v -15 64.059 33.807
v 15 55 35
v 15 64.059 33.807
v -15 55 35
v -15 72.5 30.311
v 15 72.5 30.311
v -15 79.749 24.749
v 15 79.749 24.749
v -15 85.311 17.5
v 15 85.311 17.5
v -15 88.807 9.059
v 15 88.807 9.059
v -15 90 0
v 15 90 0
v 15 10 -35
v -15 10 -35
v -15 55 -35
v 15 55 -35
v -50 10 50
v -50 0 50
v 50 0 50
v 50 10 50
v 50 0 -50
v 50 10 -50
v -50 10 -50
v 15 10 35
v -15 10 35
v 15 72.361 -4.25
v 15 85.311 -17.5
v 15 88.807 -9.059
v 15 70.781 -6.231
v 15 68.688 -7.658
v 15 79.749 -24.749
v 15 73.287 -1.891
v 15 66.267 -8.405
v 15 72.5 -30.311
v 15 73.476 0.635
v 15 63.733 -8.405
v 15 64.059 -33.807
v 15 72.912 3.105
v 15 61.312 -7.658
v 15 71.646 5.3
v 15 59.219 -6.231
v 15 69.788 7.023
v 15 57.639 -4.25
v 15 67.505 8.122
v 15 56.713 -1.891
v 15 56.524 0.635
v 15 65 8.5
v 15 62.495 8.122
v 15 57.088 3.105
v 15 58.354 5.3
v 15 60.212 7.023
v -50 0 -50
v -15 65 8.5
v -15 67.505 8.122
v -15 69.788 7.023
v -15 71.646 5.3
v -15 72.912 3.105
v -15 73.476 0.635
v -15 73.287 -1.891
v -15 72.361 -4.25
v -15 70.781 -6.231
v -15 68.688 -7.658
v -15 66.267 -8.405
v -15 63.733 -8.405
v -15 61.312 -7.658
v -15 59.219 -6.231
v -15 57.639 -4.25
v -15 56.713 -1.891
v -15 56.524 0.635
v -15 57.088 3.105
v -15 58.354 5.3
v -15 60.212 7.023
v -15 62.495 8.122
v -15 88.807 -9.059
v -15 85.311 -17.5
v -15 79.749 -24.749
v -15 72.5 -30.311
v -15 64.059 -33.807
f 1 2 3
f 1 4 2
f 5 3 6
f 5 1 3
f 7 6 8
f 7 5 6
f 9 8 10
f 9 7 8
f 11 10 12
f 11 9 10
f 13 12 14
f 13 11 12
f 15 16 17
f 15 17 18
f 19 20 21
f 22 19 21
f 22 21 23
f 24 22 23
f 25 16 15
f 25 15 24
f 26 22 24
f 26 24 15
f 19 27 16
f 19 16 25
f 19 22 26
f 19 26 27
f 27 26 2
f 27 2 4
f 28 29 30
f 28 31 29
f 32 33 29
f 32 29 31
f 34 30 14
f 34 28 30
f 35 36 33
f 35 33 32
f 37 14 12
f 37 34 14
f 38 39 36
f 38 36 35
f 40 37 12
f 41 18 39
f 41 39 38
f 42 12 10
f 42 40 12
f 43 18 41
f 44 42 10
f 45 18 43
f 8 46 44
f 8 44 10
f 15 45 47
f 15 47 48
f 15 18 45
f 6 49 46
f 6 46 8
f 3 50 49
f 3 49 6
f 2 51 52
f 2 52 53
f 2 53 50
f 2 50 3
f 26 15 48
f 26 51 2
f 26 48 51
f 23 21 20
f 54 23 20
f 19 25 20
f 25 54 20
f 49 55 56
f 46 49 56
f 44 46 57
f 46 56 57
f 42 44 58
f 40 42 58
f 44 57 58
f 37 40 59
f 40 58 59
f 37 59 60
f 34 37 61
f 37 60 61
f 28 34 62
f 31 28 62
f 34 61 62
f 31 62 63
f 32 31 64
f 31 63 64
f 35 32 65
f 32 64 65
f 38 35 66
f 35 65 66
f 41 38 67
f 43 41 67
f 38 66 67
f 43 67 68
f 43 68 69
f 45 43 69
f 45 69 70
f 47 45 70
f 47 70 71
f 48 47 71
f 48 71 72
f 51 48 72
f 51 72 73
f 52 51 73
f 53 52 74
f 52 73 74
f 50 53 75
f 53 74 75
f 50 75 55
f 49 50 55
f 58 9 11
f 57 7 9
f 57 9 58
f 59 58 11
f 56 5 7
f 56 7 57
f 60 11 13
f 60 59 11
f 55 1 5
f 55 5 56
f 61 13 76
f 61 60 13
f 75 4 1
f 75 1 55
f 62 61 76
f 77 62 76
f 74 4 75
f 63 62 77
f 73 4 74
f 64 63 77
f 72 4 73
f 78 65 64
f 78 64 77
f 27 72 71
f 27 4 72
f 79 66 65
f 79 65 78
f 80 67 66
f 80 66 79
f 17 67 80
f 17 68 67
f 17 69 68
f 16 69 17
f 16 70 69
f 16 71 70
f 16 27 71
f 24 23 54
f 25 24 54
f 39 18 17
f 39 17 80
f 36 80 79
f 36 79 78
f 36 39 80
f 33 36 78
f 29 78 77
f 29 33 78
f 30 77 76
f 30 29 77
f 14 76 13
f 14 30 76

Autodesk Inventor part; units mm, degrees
ref_plane "YZ Plane" through (0, 0, 0) normal (1, 0, 0) x (0, 1, 0)
ref_plane "XZ Plane" through (0, 0, 0) normal (0, 1, 0) x (-1, 0, 0)
ref_plane "XY Plane" through (0, 0, 0) normal (0, 0, 1) x (1, 0, 0)
sketch "Boceto1" plane through (0, 0, 0) normal (0, 1, 0) x (-1, 0, 0)
  line L0 (50, 50) -> (-50, 50)
  line L1 (-50, 50) -> (-50, -50)
  line L2 (-50, -50) -> (50, -50)
  line L3 (50, -50) -> (50, 50)
  line L4 (50, 50) -> (-50, -50) construction
  line L5 (-50, 50) -> (50, -50) construction
  point P0 (0, 0)
  dimension "d0" = 100
  dimension "d1" = 100
extrude "Extrusión1" add sketch "Boceto1" along normal blind 10
sketch "Boceto2" plane through (0, 10, 0) normal (0, 1, 0) x (1, 0, 0)
  line L0 (-15, 35) -> (15, 35)
  line L1 (15, 35) -> (15, -35)
  line L2 (15, -35) -> (-15, -35)
  line L3 (-15, -35) -> (-15, 35)
  line L4 (-15, 35) -> (15, -35) construction
  line L5 (15, 35) -> (-15, -35) construction
  point P0 (0, 0)
  dimension "d4" = 70
  dimension "d5" = 30
extrude "Extrusión2" add sketch "Boceto2" along normal blind 80
sketch "Boceto3" plane through (-15, 10, -35) normal (-1, 0, 0) x (0, 0, 1)
  circle A0 centre (35, 55) radius 8.5
  line L0 (0, 0) -> (0, 80) projected
  line L1 (0, 80) -> (70, 80) projected
  point P0 (35, -10)
  dimension "d8" = 17
  dimension "d9" = 35
  dimension "d10" = 25
extrude "Extrusión3" cut sketch "Boceto3" along normal mid plane 80
fillet "Empalme1" radius 35 1 edges at (0, 90, -35)
fillet "Empalme2" radius 35 1 edges at (0, 90, 35)
properties part number "02_10 Soporte01" material "Acero ASTM A36"
